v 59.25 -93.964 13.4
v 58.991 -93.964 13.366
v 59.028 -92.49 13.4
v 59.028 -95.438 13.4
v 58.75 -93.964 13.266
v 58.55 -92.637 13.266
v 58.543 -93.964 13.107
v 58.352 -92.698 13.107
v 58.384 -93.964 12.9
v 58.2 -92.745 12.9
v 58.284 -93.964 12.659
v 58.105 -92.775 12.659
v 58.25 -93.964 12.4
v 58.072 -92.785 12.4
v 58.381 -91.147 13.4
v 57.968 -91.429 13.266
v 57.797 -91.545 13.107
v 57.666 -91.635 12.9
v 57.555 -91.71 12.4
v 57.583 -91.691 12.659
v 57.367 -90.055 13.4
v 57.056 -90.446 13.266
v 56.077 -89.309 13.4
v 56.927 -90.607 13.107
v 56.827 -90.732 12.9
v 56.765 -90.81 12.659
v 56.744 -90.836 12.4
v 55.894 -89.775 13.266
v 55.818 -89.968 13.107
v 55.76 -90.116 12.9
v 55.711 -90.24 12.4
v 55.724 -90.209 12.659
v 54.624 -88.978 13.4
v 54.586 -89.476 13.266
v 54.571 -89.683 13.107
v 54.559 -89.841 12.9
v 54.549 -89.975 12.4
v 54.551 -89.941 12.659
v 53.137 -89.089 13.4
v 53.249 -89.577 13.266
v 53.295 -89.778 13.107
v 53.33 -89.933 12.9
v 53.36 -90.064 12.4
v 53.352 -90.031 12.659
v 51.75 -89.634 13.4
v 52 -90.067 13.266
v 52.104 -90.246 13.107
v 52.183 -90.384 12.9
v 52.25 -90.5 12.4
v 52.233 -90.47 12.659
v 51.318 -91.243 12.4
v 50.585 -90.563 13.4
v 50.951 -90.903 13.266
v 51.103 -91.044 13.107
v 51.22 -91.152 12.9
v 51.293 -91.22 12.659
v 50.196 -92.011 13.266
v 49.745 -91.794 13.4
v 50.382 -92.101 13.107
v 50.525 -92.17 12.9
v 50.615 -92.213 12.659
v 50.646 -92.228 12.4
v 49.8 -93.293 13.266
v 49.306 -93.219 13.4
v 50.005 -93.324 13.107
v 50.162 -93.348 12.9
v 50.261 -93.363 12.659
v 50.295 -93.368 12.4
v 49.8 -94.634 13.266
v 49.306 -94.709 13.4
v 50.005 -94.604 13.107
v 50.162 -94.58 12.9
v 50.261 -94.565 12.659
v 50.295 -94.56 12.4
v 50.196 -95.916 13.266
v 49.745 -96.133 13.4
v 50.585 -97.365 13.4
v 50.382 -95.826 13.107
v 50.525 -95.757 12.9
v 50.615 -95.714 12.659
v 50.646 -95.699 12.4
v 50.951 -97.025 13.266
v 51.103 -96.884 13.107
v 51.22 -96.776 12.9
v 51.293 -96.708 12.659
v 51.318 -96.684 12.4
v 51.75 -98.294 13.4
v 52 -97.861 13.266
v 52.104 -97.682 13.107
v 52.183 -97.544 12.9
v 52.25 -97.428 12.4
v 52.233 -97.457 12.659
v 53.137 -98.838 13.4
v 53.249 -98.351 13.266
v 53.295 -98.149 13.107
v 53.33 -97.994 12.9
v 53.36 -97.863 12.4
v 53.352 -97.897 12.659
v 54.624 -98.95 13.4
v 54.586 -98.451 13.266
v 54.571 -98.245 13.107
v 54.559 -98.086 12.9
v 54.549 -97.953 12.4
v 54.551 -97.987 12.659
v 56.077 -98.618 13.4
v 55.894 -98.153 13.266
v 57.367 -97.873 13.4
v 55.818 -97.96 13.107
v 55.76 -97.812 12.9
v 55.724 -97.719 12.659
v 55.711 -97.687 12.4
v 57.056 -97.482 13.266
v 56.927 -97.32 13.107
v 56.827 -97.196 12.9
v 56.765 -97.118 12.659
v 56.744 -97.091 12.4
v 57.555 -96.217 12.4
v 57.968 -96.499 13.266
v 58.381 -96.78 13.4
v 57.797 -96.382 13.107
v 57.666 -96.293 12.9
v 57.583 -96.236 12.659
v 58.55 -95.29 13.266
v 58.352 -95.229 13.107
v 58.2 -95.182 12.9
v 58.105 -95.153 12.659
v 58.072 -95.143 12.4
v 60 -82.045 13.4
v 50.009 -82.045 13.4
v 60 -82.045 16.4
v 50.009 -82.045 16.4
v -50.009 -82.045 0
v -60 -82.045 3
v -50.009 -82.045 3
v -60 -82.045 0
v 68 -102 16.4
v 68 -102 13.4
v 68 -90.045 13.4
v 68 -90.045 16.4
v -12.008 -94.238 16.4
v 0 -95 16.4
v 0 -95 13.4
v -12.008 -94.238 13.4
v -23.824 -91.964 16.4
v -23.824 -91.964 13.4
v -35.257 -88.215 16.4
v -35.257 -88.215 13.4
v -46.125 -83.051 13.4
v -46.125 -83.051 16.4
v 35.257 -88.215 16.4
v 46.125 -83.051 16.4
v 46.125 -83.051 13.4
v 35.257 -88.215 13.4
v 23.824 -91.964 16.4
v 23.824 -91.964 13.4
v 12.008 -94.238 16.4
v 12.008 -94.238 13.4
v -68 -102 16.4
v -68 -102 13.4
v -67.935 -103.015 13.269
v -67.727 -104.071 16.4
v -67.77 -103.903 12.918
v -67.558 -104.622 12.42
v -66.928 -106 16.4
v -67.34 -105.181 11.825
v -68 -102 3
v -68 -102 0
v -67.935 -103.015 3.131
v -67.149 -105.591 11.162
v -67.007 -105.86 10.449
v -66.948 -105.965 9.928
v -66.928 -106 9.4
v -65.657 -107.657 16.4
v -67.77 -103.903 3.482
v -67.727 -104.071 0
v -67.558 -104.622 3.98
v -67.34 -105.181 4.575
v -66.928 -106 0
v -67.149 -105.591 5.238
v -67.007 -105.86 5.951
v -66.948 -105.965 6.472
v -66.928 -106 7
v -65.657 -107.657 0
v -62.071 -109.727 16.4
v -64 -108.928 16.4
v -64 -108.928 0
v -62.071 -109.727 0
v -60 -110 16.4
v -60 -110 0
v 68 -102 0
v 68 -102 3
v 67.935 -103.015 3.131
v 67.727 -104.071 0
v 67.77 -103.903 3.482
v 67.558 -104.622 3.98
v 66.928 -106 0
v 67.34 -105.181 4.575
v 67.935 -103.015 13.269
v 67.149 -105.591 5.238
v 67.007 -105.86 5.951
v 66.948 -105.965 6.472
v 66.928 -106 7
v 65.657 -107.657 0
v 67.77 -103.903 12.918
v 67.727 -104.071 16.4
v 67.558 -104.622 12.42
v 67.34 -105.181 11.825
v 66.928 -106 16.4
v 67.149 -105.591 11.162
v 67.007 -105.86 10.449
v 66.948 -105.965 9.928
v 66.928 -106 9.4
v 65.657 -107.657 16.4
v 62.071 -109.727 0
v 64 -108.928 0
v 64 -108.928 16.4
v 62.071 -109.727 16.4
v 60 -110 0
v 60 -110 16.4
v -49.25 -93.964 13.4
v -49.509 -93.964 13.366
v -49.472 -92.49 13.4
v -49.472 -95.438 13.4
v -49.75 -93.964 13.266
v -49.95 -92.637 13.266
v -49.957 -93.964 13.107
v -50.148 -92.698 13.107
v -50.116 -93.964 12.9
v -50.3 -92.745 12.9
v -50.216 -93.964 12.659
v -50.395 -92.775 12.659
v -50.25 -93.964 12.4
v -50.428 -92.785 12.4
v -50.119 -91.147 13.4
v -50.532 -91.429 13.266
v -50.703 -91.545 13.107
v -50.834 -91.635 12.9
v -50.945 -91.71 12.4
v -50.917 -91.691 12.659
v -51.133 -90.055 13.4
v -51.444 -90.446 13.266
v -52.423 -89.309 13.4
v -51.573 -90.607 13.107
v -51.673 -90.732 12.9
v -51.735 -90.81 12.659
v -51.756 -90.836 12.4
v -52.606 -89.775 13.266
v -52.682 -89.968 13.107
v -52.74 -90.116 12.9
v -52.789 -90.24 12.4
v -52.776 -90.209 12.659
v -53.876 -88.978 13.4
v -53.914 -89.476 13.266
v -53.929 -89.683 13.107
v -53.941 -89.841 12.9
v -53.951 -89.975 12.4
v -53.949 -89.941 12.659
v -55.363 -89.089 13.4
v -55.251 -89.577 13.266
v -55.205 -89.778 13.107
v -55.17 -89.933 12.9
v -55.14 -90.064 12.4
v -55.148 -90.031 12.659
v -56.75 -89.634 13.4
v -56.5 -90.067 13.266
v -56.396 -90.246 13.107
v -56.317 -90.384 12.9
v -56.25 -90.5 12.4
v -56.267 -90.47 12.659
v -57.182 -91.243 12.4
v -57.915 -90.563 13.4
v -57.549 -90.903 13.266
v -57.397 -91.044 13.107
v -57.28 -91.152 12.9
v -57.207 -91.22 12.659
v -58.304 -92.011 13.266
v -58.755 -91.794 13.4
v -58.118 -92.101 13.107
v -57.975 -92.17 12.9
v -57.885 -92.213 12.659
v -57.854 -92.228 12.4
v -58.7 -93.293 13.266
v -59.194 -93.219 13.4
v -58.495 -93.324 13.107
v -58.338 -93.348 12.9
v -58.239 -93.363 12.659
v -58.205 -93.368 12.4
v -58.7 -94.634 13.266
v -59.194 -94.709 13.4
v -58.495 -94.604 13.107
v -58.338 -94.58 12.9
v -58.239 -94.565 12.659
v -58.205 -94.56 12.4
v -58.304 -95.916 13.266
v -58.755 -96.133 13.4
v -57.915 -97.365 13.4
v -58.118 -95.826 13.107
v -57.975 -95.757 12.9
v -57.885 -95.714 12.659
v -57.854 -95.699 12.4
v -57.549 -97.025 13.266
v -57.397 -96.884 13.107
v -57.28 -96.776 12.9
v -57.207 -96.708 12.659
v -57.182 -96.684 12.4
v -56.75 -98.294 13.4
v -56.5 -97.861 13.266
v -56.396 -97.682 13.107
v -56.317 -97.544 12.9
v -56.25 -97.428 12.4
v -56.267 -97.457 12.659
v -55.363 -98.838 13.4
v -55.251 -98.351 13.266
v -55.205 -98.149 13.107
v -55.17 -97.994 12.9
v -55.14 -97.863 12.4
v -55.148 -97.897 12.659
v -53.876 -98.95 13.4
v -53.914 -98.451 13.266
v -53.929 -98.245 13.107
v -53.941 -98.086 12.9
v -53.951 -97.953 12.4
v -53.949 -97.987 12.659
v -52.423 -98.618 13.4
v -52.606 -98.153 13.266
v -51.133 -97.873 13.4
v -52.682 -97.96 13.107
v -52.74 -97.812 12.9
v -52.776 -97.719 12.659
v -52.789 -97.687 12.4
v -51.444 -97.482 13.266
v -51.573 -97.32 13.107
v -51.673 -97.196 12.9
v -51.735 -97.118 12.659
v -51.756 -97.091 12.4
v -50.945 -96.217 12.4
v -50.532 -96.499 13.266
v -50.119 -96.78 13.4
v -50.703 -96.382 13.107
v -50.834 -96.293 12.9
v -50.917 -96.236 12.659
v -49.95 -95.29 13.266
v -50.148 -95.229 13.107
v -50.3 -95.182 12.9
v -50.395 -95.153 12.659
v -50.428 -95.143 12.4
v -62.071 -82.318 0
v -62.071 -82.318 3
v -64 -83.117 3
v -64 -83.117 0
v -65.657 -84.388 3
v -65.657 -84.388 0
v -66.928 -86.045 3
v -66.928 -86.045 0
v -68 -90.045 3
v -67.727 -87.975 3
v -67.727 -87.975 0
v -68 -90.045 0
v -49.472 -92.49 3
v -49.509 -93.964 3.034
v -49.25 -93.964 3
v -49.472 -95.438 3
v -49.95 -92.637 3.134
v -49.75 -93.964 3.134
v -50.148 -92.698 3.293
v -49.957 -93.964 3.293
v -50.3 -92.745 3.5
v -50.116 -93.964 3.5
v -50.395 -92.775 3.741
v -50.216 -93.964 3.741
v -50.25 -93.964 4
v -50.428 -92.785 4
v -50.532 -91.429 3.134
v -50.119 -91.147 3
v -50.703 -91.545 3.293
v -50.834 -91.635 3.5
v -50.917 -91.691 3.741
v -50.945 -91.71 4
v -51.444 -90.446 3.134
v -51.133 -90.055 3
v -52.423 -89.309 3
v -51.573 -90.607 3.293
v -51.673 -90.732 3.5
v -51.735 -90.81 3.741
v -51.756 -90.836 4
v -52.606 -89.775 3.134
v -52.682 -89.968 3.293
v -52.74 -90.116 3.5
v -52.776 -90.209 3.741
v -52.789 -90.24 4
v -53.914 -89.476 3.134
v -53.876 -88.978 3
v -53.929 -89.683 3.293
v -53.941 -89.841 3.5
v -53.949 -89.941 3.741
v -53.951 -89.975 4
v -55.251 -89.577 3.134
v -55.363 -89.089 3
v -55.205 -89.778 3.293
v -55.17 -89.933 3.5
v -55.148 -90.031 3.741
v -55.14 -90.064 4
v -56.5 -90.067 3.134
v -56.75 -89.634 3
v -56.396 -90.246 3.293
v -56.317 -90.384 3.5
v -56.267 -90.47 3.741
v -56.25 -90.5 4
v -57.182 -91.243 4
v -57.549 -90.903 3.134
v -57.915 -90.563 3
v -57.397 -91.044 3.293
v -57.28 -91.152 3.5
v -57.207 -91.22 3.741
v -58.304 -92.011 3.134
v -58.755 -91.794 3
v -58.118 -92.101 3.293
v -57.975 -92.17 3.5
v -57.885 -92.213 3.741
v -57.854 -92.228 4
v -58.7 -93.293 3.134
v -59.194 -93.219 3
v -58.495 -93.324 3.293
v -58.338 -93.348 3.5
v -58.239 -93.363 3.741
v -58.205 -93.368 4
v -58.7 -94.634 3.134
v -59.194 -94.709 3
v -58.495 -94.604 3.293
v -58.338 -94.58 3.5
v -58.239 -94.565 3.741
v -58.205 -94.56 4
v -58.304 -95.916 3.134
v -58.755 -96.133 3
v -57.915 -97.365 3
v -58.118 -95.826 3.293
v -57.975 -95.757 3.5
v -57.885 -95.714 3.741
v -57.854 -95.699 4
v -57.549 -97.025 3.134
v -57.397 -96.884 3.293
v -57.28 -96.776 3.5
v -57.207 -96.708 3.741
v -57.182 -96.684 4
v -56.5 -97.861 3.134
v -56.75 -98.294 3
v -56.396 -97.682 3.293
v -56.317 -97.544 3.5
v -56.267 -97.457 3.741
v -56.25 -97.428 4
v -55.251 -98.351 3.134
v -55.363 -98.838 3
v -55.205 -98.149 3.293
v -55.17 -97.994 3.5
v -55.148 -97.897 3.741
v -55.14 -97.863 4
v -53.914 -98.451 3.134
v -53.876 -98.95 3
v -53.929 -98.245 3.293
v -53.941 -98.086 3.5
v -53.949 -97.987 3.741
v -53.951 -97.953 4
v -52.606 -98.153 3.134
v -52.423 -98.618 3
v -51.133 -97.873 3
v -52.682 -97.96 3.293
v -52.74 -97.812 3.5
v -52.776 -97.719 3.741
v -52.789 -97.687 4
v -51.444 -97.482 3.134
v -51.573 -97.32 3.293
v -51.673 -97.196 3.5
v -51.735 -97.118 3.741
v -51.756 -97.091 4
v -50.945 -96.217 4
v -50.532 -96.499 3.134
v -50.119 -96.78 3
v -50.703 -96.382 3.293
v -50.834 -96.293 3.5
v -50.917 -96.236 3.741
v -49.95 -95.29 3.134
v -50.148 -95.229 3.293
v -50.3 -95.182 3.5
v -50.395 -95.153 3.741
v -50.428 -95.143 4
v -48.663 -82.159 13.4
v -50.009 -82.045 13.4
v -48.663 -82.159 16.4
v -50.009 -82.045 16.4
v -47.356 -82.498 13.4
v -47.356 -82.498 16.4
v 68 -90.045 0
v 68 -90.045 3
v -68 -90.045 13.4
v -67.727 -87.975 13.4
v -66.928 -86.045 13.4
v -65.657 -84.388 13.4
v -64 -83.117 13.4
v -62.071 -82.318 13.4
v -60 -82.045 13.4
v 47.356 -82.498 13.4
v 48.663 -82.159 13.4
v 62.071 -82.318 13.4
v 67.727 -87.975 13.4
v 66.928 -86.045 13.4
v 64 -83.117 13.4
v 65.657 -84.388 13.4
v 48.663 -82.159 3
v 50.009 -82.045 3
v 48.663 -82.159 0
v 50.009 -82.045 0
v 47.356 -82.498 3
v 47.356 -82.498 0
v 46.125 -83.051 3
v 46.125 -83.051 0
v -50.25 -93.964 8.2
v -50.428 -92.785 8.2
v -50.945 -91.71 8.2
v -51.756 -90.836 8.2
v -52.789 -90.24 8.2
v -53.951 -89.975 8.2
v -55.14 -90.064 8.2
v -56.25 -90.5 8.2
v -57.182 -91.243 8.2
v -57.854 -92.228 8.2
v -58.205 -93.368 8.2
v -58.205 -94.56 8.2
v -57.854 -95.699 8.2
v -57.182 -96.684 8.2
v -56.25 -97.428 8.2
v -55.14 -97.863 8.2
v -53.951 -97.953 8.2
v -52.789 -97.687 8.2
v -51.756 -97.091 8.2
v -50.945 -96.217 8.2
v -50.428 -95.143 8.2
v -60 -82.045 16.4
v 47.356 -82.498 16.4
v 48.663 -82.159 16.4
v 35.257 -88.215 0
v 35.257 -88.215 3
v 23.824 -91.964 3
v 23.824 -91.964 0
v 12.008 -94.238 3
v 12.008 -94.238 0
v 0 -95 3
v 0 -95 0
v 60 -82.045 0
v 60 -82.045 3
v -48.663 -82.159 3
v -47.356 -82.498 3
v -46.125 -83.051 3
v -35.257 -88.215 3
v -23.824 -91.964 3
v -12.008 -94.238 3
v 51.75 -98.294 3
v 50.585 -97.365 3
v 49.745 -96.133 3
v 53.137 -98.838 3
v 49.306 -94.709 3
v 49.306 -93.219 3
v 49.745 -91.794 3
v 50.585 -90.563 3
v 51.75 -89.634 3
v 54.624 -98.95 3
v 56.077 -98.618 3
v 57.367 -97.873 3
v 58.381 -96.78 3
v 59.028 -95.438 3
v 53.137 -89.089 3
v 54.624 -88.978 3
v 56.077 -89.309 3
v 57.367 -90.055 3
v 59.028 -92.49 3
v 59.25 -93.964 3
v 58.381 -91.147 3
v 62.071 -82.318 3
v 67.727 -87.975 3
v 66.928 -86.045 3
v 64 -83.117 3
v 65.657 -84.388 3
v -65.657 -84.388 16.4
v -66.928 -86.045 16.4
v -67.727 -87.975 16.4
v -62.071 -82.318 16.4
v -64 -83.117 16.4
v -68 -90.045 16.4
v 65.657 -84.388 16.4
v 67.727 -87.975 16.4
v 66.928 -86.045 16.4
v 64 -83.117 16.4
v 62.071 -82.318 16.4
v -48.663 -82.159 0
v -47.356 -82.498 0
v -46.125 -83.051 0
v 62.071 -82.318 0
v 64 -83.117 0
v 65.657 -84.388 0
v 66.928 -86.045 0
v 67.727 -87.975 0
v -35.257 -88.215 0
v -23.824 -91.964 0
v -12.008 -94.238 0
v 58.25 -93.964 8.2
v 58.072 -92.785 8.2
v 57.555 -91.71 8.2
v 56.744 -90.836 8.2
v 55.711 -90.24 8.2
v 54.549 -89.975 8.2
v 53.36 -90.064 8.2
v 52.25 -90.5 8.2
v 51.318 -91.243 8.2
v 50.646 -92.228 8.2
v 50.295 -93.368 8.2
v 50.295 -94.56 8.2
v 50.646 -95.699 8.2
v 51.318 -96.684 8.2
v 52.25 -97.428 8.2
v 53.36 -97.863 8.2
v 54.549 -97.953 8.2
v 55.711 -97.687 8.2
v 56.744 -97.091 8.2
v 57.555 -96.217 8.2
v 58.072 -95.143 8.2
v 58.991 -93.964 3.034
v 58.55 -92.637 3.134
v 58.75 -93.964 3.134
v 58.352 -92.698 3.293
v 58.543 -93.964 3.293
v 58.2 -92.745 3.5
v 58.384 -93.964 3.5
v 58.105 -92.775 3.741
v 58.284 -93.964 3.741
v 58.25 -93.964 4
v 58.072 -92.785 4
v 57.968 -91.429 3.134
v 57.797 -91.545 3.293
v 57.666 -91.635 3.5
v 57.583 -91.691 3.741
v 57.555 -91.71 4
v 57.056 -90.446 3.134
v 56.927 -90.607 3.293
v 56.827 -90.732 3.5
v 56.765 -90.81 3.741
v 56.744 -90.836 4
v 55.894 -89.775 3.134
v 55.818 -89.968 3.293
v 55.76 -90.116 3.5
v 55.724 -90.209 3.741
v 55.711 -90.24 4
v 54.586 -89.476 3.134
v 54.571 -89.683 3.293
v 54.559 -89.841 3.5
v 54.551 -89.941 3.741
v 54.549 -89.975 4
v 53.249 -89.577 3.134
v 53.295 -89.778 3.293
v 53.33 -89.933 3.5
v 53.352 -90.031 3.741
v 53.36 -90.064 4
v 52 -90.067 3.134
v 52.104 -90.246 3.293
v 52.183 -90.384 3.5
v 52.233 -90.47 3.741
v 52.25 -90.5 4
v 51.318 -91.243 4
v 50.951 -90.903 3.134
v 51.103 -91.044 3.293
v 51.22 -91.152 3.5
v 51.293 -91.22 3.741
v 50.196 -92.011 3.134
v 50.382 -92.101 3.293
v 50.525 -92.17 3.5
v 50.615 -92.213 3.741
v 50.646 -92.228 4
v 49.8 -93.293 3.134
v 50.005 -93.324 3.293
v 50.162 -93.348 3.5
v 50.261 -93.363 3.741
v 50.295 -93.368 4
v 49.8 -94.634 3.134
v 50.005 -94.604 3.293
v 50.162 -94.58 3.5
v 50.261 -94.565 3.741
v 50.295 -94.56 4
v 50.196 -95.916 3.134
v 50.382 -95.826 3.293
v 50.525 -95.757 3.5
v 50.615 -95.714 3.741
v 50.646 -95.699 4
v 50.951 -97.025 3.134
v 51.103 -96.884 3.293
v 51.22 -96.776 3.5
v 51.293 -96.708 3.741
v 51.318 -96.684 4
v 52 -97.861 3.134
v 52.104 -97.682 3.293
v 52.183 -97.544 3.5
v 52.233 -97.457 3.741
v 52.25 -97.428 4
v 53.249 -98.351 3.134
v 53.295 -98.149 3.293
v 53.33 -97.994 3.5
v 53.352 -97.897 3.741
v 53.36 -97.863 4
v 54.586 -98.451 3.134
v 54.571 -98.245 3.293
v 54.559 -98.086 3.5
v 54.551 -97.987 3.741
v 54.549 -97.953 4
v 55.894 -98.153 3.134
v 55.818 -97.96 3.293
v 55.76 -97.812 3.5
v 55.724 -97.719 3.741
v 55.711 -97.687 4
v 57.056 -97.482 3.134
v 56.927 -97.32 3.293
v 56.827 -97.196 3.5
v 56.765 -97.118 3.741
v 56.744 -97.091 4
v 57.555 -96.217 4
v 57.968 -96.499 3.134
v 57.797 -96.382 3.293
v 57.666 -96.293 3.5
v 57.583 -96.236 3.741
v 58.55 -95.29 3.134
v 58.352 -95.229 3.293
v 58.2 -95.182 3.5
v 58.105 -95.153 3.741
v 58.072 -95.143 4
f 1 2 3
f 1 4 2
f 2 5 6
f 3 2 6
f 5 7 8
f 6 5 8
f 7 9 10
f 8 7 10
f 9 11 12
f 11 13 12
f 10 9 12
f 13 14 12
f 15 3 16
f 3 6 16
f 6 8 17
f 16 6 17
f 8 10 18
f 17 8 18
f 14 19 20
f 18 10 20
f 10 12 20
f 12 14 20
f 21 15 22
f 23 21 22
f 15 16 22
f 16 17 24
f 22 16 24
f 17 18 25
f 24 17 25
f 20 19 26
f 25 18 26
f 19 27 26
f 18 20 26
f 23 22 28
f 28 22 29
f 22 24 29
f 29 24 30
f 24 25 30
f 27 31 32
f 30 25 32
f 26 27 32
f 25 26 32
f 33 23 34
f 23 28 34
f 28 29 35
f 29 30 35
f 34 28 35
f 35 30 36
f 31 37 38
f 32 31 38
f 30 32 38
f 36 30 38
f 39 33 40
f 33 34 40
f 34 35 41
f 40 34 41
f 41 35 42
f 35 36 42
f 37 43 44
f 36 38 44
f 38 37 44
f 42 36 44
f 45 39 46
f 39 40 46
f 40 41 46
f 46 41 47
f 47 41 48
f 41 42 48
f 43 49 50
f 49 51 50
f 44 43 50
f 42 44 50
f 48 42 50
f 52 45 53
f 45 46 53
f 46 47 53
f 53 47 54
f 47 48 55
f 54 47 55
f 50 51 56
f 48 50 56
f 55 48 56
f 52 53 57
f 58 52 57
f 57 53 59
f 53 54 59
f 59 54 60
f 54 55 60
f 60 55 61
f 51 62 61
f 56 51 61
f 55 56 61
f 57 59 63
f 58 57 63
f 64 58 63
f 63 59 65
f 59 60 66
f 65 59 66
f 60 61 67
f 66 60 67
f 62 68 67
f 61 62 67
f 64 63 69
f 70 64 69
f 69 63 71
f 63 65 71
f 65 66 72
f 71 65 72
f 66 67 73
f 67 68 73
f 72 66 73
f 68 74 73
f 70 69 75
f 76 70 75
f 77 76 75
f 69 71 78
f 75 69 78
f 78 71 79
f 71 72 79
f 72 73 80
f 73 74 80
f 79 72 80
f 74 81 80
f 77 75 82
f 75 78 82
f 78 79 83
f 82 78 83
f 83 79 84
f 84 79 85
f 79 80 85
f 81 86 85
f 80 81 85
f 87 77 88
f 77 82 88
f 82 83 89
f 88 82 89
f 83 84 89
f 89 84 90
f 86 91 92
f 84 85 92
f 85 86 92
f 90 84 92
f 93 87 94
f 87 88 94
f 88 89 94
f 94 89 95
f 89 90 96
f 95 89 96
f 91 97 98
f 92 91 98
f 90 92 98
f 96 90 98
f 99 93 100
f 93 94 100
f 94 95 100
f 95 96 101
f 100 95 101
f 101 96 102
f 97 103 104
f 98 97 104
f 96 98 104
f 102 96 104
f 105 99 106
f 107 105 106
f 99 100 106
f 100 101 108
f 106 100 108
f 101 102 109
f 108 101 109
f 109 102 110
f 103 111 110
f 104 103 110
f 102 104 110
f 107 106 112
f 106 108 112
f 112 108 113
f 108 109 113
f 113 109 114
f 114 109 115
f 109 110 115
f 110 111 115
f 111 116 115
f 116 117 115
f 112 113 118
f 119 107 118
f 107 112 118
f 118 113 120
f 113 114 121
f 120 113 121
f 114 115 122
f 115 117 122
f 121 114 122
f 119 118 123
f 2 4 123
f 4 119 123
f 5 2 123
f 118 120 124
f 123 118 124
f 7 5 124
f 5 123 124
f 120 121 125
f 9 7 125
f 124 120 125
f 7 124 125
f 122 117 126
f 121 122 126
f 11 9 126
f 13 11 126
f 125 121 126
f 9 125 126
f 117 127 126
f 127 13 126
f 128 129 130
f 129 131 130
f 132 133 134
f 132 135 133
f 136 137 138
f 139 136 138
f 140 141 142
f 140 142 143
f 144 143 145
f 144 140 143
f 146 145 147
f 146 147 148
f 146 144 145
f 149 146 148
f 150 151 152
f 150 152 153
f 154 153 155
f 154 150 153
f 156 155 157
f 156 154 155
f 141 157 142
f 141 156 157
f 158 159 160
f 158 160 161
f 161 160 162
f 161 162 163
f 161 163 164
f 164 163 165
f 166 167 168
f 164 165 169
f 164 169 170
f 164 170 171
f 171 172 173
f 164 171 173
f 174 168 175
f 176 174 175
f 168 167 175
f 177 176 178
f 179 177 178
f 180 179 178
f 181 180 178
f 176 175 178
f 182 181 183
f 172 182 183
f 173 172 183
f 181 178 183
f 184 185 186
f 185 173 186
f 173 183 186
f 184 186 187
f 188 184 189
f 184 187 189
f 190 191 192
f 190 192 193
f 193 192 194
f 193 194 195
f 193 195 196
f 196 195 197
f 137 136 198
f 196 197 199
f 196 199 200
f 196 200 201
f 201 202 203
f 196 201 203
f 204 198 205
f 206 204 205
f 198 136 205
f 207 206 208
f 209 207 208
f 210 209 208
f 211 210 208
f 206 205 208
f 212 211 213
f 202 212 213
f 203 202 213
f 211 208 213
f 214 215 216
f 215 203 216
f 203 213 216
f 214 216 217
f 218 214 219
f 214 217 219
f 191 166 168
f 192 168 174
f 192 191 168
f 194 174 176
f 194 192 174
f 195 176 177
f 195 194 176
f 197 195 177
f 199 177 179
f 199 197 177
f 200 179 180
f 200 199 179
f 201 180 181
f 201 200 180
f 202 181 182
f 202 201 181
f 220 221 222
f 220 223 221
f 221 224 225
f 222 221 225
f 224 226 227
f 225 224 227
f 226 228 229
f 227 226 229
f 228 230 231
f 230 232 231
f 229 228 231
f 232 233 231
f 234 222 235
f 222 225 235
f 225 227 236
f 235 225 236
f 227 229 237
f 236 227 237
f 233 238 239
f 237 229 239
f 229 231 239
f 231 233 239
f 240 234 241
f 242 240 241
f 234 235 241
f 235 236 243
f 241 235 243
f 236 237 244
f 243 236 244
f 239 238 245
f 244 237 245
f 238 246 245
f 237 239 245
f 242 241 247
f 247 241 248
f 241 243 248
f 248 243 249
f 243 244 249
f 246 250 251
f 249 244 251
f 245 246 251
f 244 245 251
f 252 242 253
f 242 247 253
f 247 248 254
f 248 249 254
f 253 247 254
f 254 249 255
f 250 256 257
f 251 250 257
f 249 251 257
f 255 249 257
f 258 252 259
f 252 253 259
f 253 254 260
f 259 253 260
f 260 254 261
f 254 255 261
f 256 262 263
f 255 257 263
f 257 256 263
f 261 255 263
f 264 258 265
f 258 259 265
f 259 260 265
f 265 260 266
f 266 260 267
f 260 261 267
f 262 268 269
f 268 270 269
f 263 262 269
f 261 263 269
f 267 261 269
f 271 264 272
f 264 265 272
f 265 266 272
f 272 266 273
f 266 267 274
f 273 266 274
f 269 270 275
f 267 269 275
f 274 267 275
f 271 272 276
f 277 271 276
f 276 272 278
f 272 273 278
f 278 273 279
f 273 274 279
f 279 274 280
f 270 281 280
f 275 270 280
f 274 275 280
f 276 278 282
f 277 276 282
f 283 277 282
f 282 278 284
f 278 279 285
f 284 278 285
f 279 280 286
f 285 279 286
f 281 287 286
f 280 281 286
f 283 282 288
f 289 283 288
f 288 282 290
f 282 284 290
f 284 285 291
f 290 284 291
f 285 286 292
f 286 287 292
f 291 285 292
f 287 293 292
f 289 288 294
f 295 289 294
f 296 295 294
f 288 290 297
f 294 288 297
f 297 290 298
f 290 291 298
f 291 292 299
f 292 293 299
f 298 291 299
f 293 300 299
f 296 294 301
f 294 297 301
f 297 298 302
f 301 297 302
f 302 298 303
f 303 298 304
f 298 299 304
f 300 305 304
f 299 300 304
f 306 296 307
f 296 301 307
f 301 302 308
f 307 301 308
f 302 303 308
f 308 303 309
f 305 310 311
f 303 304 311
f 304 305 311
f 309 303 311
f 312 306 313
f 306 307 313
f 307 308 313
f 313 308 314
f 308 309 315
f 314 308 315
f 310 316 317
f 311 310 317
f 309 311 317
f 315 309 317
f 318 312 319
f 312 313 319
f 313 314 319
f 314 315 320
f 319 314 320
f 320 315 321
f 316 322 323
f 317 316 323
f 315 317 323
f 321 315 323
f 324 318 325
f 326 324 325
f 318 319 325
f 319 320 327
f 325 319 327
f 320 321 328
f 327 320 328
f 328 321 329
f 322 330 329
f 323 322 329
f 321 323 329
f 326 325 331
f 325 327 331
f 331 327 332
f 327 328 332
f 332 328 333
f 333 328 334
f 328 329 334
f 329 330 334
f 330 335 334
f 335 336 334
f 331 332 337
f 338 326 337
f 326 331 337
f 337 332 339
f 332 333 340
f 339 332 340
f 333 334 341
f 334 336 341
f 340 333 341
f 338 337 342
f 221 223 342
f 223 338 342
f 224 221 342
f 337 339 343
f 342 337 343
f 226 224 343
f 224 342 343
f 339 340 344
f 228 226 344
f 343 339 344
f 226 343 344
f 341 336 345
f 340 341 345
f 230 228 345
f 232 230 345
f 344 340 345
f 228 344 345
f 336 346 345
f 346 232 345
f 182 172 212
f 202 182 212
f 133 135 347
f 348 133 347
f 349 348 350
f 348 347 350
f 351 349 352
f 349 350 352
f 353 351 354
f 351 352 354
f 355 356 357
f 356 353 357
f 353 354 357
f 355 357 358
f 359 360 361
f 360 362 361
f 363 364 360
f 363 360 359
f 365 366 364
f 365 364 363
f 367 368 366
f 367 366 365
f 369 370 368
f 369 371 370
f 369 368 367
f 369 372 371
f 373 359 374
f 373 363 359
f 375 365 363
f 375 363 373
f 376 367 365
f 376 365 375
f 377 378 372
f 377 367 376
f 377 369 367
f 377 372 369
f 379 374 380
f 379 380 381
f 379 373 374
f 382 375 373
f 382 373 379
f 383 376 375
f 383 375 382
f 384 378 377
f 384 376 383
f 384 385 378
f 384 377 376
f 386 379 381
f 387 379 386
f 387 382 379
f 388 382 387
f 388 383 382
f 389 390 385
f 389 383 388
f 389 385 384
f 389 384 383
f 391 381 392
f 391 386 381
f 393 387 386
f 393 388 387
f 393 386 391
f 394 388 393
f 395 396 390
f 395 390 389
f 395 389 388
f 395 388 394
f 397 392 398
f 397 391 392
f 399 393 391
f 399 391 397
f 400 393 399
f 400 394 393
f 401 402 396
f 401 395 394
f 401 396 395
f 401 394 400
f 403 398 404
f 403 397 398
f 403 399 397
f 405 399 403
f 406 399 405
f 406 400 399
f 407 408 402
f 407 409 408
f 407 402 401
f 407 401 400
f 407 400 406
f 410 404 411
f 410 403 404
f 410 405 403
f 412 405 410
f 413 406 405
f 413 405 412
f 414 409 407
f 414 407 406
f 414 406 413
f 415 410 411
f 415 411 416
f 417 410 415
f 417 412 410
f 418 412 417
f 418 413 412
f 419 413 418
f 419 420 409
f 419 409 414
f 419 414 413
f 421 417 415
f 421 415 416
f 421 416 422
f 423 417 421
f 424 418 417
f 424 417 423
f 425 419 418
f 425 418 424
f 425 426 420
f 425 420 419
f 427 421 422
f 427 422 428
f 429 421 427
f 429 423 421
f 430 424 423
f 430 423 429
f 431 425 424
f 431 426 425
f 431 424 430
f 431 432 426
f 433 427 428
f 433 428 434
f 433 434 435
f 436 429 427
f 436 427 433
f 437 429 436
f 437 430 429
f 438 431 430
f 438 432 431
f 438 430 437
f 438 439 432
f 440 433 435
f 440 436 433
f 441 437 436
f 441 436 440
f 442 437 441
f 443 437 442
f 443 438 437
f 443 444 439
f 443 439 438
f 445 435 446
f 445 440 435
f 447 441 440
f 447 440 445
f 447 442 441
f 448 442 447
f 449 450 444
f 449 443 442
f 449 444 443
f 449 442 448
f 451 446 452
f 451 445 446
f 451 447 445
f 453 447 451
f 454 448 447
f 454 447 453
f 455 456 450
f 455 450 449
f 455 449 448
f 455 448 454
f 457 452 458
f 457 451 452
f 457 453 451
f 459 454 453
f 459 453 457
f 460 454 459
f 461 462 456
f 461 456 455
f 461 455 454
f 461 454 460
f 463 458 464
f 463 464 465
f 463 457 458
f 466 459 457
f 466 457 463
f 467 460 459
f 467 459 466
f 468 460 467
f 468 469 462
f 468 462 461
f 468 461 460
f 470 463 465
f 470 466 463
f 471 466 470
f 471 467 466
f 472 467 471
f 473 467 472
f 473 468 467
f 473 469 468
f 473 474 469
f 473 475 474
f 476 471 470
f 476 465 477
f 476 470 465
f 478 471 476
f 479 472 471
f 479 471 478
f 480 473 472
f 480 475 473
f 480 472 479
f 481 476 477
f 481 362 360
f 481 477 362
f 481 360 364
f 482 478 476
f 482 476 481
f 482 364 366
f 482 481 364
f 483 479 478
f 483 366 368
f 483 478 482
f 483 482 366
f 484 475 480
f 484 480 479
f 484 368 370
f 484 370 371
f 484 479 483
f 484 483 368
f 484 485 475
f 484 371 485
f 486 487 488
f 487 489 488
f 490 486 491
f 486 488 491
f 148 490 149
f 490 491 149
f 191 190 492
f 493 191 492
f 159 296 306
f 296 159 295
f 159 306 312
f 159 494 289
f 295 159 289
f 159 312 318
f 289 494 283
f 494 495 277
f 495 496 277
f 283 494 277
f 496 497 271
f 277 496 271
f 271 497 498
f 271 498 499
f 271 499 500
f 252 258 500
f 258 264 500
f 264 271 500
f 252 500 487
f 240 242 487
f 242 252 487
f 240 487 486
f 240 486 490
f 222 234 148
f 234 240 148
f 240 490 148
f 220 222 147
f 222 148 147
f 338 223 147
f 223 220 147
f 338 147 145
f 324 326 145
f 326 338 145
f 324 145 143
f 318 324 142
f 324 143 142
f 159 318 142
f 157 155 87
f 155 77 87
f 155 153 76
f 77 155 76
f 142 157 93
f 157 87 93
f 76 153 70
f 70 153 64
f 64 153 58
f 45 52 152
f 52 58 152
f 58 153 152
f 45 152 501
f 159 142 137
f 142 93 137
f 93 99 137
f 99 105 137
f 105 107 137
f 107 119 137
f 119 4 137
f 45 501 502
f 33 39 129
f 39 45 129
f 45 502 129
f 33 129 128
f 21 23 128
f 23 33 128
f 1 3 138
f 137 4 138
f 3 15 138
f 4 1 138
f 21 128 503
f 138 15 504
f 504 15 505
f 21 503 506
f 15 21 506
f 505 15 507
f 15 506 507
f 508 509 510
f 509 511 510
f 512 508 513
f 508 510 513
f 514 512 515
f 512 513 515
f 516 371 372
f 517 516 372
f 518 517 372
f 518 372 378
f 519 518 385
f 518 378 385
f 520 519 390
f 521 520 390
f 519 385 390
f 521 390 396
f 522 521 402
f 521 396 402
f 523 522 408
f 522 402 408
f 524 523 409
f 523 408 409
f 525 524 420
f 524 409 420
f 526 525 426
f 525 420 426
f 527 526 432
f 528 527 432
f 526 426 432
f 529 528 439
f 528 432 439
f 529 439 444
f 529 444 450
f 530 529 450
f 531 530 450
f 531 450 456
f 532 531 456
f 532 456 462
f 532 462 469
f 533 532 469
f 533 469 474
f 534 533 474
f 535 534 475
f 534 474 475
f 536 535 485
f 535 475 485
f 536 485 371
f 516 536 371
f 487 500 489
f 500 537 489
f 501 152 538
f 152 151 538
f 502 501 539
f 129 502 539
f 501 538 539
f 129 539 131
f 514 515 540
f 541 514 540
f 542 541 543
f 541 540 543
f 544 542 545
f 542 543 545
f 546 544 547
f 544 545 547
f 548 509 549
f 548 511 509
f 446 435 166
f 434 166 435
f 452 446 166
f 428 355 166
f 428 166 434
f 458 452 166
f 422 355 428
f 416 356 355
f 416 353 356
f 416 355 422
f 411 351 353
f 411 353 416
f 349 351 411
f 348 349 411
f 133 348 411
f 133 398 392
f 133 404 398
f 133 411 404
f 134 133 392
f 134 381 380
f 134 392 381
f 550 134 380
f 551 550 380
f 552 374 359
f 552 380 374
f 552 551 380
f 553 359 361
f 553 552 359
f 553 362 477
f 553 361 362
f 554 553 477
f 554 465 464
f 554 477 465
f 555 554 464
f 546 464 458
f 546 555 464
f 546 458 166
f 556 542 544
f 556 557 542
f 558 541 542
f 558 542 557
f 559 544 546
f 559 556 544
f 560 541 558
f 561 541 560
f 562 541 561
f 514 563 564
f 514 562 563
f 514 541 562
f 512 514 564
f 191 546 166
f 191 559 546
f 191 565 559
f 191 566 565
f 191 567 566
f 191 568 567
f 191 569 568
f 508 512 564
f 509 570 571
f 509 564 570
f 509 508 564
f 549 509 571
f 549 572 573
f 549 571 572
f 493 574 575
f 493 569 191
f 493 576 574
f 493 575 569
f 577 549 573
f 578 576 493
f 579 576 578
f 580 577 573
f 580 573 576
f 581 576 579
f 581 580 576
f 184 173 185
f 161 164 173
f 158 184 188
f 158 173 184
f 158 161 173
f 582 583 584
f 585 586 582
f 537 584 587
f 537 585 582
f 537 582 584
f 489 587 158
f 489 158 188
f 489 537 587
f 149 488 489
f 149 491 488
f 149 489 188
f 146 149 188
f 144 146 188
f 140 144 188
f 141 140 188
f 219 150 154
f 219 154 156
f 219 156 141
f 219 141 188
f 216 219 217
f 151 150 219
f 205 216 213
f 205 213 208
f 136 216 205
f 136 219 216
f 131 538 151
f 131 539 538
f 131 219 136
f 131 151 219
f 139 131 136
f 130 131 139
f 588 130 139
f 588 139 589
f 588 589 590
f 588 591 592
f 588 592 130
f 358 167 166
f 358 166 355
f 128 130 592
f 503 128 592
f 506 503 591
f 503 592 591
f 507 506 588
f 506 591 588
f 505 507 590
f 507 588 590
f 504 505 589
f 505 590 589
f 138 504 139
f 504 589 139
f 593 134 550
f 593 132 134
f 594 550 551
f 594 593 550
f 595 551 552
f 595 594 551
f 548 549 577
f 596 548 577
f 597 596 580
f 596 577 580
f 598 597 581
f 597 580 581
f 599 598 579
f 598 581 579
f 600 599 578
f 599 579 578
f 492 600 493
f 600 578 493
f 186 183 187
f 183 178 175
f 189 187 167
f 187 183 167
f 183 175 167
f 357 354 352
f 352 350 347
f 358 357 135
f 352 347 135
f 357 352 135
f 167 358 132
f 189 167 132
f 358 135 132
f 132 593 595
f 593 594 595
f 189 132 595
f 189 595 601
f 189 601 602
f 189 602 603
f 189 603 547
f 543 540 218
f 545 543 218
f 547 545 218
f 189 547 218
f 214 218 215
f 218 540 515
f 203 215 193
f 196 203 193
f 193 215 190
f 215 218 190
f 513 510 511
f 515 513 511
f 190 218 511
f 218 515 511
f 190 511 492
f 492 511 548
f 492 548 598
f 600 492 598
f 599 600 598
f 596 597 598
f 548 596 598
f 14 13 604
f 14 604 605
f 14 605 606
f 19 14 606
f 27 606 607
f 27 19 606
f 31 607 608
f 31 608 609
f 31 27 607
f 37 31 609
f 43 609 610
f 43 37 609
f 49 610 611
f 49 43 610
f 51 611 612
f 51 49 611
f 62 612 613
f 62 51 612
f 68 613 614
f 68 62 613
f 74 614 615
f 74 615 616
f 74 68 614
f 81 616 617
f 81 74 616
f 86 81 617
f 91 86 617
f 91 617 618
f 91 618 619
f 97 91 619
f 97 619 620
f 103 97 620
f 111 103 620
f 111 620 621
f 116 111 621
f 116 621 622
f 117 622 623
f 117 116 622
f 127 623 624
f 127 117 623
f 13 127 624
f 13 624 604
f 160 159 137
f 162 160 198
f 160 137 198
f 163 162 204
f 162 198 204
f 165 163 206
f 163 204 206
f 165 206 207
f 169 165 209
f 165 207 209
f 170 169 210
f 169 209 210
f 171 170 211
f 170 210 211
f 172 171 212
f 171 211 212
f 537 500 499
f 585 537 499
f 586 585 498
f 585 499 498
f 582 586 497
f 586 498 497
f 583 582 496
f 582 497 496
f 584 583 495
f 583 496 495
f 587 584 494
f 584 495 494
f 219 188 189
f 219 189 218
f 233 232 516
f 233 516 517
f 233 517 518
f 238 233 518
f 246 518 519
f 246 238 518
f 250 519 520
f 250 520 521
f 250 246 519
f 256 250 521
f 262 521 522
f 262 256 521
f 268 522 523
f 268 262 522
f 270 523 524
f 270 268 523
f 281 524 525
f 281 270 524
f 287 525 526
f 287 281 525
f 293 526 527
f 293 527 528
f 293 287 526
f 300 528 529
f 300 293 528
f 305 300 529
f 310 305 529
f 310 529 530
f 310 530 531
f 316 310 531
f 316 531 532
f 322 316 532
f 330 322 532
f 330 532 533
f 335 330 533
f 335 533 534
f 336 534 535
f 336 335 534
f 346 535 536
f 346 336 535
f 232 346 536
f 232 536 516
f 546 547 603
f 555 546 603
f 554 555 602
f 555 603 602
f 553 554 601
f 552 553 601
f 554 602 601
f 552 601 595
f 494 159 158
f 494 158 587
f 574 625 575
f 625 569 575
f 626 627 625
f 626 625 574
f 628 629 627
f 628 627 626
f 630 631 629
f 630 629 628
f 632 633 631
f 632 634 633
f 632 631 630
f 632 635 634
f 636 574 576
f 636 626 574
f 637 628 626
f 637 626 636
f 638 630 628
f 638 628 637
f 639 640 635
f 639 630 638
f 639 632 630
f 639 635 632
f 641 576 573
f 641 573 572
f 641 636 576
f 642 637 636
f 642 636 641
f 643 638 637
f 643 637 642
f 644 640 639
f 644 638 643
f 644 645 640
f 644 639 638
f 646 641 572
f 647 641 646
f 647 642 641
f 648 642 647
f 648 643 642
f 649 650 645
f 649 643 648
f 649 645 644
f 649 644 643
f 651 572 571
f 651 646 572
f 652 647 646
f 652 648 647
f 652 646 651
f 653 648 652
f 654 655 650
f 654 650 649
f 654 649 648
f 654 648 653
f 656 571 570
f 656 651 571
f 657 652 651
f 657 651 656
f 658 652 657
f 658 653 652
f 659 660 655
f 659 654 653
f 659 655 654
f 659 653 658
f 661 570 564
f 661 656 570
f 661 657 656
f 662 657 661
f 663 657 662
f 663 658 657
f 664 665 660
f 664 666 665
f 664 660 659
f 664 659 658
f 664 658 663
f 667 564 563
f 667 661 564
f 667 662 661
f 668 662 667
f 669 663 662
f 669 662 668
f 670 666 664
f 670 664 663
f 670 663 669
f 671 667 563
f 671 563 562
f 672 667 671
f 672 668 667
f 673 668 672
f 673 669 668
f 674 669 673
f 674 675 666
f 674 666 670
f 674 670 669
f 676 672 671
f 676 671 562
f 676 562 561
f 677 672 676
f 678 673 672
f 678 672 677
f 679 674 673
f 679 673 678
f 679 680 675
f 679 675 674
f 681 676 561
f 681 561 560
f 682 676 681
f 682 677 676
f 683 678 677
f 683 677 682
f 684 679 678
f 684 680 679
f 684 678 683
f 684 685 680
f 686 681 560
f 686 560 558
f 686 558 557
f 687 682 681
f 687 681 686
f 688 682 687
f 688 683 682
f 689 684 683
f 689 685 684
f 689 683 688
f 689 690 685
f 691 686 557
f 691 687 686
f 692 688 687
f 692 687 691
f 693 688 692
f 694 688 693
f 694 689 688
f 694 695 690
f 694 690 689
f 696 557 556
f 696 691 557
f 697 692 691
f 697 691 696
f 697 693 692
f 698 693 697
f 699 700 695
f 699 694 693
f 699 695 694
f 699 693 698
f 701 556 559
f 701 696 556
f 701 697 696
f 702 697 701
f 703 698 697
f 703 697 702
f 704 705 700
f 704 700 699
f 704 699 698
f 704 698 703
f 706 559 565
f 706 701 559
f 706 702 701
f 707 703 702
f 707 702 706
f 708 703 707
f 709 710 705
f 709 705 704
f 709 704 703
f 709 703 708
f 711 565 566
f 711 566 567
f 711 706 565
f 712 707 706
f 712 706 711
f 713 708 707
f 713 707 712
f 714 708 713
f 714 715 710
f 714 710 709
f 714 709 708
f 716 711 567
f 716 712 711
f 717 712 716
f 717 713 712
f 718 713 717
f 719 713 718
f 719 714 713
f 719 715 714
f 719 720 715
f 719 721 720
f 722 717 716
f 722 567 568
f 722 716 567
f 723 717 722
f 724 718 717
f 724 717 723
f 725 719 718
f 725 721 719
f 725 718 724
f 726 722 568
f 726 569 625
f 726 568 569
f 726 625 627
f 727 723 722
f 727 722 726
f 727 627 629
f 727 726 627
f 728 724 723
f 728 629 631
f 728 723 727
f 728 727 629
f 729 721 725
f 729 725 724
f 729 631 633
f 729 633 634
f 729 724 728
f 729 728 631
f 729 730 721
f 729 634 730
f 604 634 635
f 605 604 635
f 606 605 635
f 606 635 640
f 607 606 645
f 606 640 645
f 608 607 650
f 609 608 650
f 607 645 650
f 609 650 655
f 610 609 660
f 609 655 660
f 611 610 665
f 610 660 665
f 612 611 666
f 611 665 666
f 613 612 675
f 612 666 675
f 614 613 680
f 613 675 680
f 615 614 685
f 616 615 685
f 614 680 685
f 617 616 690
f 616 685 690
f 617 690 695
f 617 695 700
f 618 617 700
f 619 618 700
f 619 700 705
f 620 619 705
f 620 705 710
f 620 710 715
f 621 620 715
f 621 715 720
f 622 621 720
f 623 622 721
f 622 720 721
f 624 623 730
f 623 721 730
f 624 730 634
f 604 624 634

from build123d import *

# Parameters (mm, degrees)
BOSS_EXTRUDE1_DEPTH     = 3
SKETCH2_R               = 4
SKETCH2_W               = 200
SKETCH2_H               = 4
BOSS_EXTRUDE2_DEPTH     = 5.2
CUT_EXTRUDE3_DEPTH      = 149.751605033
CUT_EXTRUDE3_DEPTH_BACK = 149.751605033
SKETCH4_W               = 200.256598964
SKETCH4_H               = 45.821107358
CUT_EXTRUDE4_DEPTH      = 149.886668308
CUT_EXTRUDE4_DEPTH_BACK = 149.886668308
SKETCH5_W               = 32
SKETCH5_H               = 27.954907266
FILLET1_R               = 1
FILLET2_R               = 4
FILLET3_R               = 8
FILLET4_R               = 8


with BuildPart() as part:
    # Sketch1 → Boss-Extrude1 (new body)
    with BuildSketch(Plane.XY):
        with BuildLine():
            ThreePointArc((0, -110), (-59.410296816, -92.57654472), (-100, -45.82575695))
            Line((-100, -45.82575695), (-100, -110))
            Line((-100, -110), (0, -110))
        make_face()
        with BuildLine():
            ThreePointArc((0, -95), (-51.308892705, -79.95247044), (-86.363636364, -39.576790093))
            Line((-86.363636364, -39.576790093), (-100, -45.82575695))
            ThreePointArc((-100, -45.82575695), (-59.410296816, -92.57654472), (0, -110))
            Line((0, -110), (0, -95))
        make_face()
        with BuildLine():
            Line((100, -45.82575695), (86.363636364, -39.576790093))
            ThreePointArc((86.363636364, -39.576790093), (51.308892705, -79.95247044), (0, -95))
            Line((0, -95), (0, -110))
            ThreePointArc((0, -110), (59.410296816, -92.57654472), (100, -45.82575695))
        make_face()
        with BuildLine():
            Line((100, -110), (100, -45.82575695))
            ThreePointArc((100, -45.82575695), (59.410296816, -92.57654472), (0, -110))
            Line((0, -110), (100, -110))
        make_face()
    extrude(amount=BOSS_EXTRUDE1_DEPTH)

    # Sketch2 → Boss-Extrude2 (add)
    with BuildSketch(Plane.XY.offset(3)):
        with Locations((-54.25, -93.963756311)):
            Circle(SKETCH2_R)
        with Locations((54.25, -93.963756311)):
            Circle(SKETCH2_R)
        with Locations((0, -108)):
            Rectangle(SKETCH2_W, SKETCH2_H)
    extrude(amount=BOSS_EXTRUDE2_DEPTH)

    # Sketch4 → Cut-Extrude3 (cut, two sides: drawn at the far end of the back side and taken through both)
    with BuildSketch(Plane.XY.offset(3).offset(-CUT_EXTRUDE3_DEPTH_BACK)):
        with Locations((0.128299482, -59.134539055)):
            Rectangle(SKETCH4_W, SKETCH4_H)
    extrude(amount=CUT_EXTRUDE3_DEPTH + CUT_EXTRUDE3_DEPTH_BACK, mode=Mode.SUBTRACT)

    # Sketch5 → Cut-Extrude4 (cut, two sides: drawn at the far end of the back side and taken through both)
    with BuildSketch(Plane(origin=(0, 0, 0), x_dir=(-1, 0, 0), z_dir=(0, 0, -1)).offset(-CUT_EXTRUDE4_DEPTH_BACK)):
        with Locations((-84, -96.022546367)):
            Rectangle(SKETCH5_W, SKETCH5_H)
        with Locations((84, -96.022546367)):
            Rectangle(SKETCH5_W, SKETCH5_H)
    extrude(amount=CUT_EXTRUDE4_DEPTH + CUT_EXTRUDE4_DEPTH_BACK, mode=Mode.SUBTRACT)

    # Fillet1
    fillet1_edges = [part.edges().sort_by_distance(p)[0] for p in [
        (50.25, -93.963756311, 3),
        (-58.25, -93.963756311, 3),
    ]]
    fillet(fillet1_edges, radius=FILLET1_R)

    # Fillet2
    fillet2_edges = [part.edges().sort_by_distance(p)[0] for p in [
        (0, -106, 3),
    ]]
    fillet(fillet2_edges, radius=FILLET2_R)

    # Mirror1: part across plane


with BuildPart() as part_1:
    add(part.part)
    add(part.part.mirror(Plane.XY.offset(8.2)))

    # Fillet3
    # the kernel refuses this fillet: 8 mm, written as the material it takes off along each edge
    with BuildSketch(Plane(origin=(-68, -110, -20), x_dir=(1, 0, 0), z_dir=(0, 0, 1)), Plane(origin=(68, -110, 36.4), x_dir=(-1, 0, 0), z_dir=(0, 0, -1))) as fillet3_piece_1:
        with BuildLine():
            CenterArc((FILLET3_R, FILLET3_R), FILLET3_R, 180, 90)
            Line((0, FILLET3_R), (0, 0))
            Line((0, 0), (FILLET3_R, 0))
        make_face()
    extrude(amount=56.4, mode=Mode.SUBTRACT)
    with BuildSketch(Plane(origin=(-68, -82.045092734, -6.6), x_dir=(1, 0, 0), z_dir=(0, 0, 1)), Plane(origin=(68, -82.045092734, 36.4), x_dir=(-1, 0, 0), z_dir=(0, 0, -1))) as fillet3_piece_2:
        with BuildLine():
            CenterArc((FILLET3_R, -FILLET3_R), FILLET3_R, 90, 90)
            Line((0, -FILLET3_R), (0, 0))
            Line((0, 0), (FILLET3_R, 0))
        make_face()
    extrude(amount=43, mode=Mode.SUBTRACT)
    with BuildSketch(Plane(origin=(68, -82.045092734, -20), x_dir=(-1, 0, 0), z_dir=(0, 0, 1)), Plane(origin=(-68, -82.045092734, 23), x_dir=(1, 0, 0), z_dir=(0, 0, -1))) as fillet3_piece_3:
        with BuildLine():
            CenterArc((FILLET3_R, FILLET3_R), FILLET3_R, 180, 90)
            Line((0, FILLET3_R), (0, 0))
            Line((0, 0), (FILLET3_R, 0))
        make_face()
    extrude(amount=43, mode=Mode.SUBTRACT)

    # Fillet4
    fillet4_edges = [part_1.edges().sort_by_distance(p)[0] for p in [
        (-47.891572936, -82.045092734, 14.9),
        (47.891572936, -82.045092734, 14.9),
        (-47.891572936, -82.045092734, 1.5),
        (47.891572936, -82.045092734, 1.5),
    ]]
    fillet(fillet4_edges, radius=FILLET4_R)


solid = part_1.part
